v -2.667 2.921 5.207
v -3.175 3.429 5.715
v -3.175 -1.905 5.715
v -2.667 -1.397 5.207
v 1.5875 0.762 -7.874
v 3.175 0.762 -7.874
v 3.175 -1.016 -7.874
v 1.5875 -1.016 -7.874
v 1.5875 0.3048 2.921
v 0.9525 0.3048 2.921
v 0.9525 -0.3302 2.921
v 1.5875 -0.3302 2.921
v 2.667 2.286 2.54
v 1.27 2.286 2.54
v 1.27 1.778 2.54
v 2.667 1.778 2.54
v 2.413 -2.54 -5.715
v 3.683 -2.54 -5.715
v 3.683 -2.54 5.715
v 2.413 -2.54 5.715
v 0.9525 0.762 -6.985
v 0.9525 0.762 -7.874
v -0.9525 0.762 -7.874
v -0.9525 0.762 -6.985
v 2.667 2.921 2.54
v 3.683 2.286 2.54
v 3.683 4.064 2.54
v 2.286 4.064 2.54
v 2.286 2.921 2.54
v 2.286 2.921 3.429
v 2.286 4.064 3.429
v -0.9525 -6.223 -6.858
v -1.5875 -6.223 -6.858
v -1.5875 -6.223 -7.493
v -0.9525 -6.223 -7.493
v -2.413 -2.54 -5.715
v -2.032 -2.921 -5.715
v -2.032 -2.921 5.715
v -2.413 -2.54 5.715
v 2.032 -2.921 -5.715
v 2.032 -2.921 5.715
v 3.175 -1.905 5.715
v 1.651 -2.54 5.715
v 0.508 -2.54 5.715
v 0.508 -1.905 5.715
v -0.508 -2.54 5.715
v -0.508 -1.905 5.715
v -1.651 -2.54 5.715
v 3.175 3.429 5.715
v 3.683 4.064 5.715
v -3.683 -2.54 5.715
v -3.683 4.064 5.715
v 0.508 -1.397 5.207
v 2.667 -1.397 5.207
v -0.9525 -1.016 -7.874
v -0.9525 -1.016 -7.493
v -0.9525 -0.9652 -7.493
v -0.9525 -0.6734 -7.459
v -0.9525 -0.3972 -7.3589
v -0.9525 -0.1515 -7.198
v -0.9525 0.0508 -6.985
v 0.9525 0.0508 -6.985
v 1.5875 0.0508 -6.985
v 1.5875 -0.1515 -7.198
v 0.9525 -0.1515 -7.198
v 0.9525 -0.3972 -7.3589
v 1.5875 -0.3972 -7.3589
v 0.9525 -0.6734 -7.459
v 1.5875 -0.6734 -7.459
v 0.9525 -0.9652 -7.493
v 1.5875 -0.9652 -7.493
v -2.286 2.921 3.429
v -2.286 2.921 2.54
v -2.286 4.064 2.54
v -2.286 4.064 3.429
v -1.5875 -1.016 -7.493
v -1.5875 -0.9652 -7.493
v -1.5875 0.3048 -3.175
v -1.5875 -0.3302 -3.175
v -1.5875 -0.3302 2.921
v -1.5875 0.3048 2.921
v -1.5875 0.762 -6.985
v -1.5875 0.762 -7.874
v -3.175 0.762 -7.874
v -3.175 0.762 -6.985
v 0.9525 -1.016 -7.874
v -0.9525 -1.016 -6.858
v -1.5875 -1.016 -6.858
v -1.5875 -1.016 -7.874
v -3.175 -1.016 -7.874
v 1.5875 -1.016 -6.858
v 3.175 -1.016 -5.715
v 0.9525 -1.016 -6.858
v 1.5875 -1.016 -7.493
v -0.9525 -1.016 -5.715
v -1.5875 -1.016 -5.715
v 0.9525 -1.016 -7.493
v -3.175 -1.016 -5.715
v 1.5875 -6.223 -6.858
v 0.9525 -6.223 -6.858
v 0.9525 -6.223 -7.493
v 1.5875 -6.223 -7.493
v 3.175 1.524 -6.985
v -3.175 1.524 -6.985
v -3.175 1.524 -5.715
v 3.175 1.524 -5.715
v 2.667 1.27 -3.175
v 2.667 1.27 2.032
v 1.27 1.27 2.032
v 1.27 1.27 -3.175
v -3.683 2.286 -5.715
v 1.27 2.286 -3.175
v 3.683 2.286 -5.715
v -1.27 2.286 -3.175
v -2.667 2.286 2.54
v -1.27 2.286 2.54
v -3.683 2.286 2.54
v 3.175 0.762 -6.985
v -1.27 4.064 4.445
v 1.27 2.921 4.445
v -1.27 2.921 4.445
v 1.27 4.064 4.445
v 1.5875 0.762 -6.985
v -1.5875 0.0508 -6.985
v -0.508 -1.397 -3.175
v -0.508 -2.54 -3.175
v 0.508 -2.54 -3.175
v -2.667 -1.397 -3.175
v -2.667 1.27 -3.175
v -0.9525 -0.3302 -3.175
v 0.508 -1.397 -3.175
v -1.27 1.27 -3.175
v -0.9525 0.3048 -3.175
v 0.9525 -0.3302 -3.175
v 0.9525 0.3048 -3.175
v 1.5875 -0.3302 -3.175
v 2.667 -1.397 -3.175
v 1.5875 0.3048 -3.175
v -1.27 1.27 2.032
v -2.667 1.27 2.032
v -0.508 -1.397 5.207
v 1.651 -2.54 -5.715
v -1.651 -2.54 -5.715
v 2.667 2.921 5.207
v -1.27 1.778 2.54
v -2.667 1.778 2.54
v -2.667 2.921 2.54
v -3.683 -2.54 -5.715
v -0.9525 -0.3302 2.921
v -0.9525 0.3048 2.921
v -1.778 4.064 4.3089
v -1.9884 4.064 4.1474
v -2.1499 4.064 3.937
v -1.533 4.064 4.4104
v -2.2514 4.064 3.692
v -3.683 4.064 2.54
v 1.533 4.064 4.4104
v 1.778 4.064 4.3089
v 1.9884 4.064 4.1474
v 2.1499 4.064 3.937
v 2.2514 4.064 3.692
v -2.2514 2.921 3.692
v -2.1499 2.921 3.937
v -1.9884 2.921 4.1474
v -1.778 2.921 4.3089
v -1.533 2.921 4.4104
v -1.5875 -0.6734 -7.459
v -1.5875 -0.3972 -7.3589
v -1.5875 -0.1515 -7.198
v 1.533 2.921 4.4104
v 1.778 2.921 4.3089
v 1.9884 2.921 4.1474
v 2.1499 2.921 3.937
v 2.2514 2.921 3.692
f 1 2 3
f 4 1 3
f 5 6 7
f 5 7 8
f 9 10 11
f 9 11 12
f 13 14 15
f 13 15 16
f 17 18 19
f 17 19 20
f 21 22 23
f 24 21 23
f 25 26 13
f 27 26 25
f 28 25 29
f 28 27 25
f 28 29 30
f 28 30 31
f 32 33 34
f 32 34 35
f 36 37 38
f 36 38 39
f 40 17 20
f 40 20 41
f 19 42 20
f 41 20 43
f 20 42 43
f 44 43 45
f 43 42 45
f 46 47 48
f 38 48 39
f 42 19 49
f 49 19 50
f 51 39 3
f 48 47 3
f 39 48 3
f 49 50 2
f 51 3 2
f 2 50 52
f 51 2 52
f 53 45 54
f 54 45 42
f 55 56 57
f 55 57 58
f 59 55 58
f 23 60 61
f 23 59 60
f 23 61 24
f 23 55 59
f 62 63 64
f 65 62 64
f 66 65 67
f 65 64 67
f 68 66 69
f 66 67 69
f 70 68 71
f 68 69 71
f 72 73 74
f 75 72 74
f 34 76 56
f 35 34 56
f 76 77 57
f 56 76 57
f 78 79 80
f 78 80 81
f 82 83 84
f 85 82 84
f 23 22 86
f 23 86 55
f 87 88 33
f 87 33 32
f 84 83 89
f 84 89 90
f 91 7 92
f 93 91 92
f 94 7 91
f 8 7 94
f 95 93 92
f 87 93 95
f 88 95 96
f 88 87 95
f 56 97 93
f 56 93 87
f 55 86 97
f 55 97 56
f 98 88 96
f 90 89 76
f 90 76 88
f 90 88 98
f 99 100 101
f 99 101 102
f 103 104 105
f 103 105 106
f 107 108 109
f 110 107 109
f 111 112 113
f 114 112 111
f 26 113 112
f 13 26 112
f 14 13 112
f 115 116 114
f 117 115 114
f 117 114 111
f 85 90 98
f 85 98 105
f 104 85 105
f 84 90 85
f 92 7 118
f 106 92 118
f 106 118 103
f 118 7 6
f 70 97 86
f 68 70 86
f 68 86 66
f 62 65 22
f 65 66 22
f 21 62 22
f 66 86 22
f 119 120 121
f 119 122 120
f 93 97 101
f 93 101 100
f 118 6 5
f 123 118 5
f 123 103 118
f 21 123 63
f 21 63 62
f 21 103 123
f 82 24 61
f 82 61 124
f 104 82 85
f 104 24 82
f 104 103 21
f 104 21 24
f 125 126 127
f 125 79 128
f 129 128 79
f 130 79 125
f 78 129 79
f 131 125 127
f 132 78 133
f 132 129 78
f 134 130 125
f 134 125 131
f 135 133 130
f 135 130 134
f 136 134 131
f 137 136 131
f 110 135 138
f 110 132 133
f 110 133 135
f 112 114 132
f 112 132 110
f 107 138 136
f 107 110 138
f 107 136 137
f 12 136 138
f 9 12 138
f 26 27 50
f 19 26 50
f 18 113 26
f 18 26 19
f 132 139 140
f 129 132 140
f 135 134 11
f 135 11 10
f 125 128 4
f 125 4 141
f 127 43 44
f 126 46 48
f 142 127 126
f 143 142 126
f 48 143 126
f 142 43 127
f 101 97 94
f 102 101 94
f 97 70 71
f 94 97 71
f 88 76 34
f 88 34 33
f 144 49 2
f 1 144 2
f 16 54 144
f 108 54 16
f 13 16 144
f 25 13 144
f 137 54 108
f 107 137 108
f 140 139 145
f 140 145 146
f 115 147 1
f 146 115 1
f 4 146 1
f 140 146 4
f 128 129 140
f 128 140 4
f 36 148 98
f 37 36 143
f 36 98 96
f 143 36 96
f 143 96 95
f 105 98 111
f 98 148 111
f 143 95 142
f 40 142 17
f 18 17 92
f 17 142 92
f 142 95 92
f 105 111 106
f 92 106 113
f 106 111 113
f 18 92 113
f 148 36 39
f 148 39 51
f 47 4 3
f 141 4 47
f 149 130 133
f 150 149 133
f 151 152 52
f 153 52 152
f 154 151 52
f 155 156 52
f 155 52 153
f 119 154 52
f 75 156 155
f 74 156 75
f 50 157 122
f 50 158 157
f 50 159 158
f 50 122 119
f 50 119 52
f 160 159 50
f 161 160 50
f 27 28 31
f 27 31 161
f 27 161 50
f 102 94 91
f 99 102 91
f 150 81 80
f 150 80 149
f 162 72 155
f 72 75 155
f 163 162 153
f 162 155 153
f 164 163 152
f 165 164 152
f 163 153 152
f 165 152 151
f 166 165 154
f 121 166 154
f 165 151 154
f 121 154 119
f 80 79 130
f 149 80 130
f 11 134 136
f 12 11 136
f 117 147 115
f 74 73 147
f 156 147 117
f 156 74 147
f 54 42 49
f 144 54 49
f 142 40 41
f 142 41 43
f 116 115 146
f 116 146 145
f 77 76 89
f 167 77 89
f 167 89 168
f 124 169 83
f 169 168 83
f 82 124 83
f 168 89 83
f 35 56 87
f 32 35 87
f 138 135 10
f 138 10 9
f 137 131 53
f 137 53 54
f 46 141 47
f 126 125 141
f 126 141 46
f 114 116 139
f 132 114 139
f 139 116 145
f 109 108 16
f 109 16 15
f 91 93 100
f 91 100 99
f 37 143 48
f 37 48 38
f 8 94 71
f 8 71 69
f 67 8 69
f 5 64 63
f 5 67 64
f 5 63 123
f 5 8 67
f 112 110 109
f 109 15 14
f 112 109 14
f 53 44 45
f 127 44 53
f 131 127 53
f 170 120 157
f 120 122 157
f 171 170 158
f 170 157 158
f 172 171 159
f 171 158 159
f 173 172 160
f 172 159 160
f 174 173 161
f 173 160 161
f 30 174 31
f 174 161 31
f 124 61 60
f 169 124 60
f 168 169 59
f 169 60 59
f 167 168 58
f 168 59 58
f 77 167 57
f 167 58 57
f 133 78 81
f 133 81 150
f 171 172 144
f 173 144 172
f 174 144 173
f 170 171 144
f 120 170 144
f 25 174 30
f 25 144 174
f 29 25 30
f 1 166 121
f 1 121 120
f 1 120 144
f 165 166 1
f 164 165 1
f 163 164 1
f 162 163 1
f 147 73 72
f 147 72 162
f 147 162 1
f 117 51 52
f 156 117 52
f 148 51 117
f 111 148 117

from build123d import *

# Parameters (mm, degrees)
BOSS_EXTRUDE1_DEPTH  = 8.255000001
CUT_EXTRUDE1_DEPTH   = 5.715
BOSS_EXTRUDE2_DEPTH  = 3.175
SKETCH4_W            = 4.572
SKETCH4_H            = 1.143
CUT_EXTRUDE2_DEPTH   = 1.905
SKETCH5_W            = 0.635
SKETCH5_H            = 0.635
BOSS_EXTRUDE3_DEPTH  = 6.096
SKETCH6_W            = 0.635
SKETCH6_H            = 0.635
BOSS_EXTRUDE4_DEPTH  = 6.096
SKETCH7_W            = 0.635
SKETCH7_H            = 1.0668
BOSS_EXTRUDE5_DEPTH  = 1.778
SKETCH8_W            = 0.635
SKETCH8_H            = 1.0668
BOSS_EXTRUDE6_DEPTH  = 1.778
SKETCH9_W            = 0.635
SKETCH9_H            = 0.635
BOSS_EXTRUDE7_DEPTH  = 5.207
SKETCH10_W           = 0.635
SKETCH10_H           = 0.635
BOSS_EXTRUDE8_DEPTH  = 5.207
BOSS_EXTRUDE9_DEPTH  = 1.27
SKETCH12_W           = 1.5875
SKETCH12_H           = 1.778
BOSS_EXTRUDE10_DEPTH = 0.889
SKETCH13_W           = 1.905
SKETCH13_H           = 1.778
BOSS_EXTRUDE11_DEPTH = 0.889
SKETCH14_W           = 1.5875
SKETCH14_H           = 1.778
BOSS_EXTRUDE12_DEPTH = 0.889
FILLET1_R            = 1.27
FILLET2_R            = 1.27
CHAMFER1_SIZE        = 0.508
CHAMFER2_SIZE        = 0.508
DRAFT1_ANGLE         = 45
CHAMFER3_SIZE        = 0.508
FILLET3_R            = 1.016


with BuildPart() as part:
    # Sketch1 → Boss-Extrude1 (new body)
    with BuildSketch(Plane.XY.offset(2.54)):
        Polygon((3.683, 2.286), (-3.683, 2.286), (-3.683, -2.54), (-2.413, -2.54), (-1.651, -3.302), (-1.651, -2.54), (1.651, -2.54), (1.651, -3.302), (2.413, -2.54), (3.683, -2.54), align=None)
    extrude(amount=-BOSS_EXTRUDE1_DEPTH)

    # Sketch2 → Cut-Extrude1 (cut)
    with BuildSketch(Plane.XY.offset(2.54)):
        Polygon((2.667, -1.397), (2.667, 1.27), (1.27, 1.27), (1.27, 2.286000001), (-1.270000001, 2.286000001), (-1.270000001, 1.27), (-2.667, 1.27), (-2.667, -1.397), (-0.508, -1.397), (-0.508, -2.54), (0.508, -2.54), (0.508, -1.397), align=None)
    extrude(amount=-CUT_EXTRUDE1_DEPTH, mode=Mode.SUBTRACT)

    # Sketch3 → Boss-Extrude2 (add)
    with BuildSketch(Plane.XY.offset(2.54)):
        Polygon((0.508, -1.397), (2.667, -1.397), (2.667, 2.921), (-2.667, 2.921), (-2.667, -1.397), (-0.508, -1.397), (-0.508, -2.54), (-1.651, -2.54), (-1.651, -3.302), (-2.413, -2.54), (-3.683, -2.54), (-3.683, 4.064), (3.683, 4.064), (3.683, -2.54), (2.413, -2.54), (1.651, -3.302), (1.651, -2.54), (0.508, -2.54), align=None)
    extrude(amount=BOSS_EXTRUDE2_DEPTH)

    # Sketch4 → Cut-Extrude2 (cut)
    with BuildSketch(Plane(origin=(0, 0, 2.54), x_dir=(-1, 0, 0), z_dir=(0, 0, -1))):
        with Locations((0, 3.4925)):
            Rectangle(SKETCH4_W, SKETCH4_H)
    extrude(amount=-CUT_EXTRUDE2_DEPTH, mode=Mode.SUBTRACT)

    # Sketch5 → Boss-Extrude3 (add)
    with BuildSketch(Plane.XY.offset(-3.175)):
        with Locations((-1.27, -0.0127)):
            Rectangle(SKETCH5_W, SKETCH5_H)
    extrude(amount=BOSS_EXTRUDE3_DEPTH)

    # Sketch6 → Boss-Extrude4 (add)
    with BuildSketch(Plane.XY.offset(-3.175)):
        with Locations((1.27, -0.0127)):
            Rectangle(SKETCH6_W, SKETCH6_H)
    extrude(amount=BOSS_EXTRUDE4_DEPTH)

    # Sketch7 → Boss-Extrude5 (add)
    with BuildSketch(Plane(origin=(0, 0, -5.715000001), x_dir=(-1, 0, 0), z_dir=(0, 0, -1))):
        with Locations((1.27, -0.4826)):
            Rectangle(SKETCH7_W, SKETCH7_H)
    extrude(amount=BOSS_EXTRUDE5_DEPTH)

    # Sketch8 → Boss-Extrude6 (add)
    with BuildSketch(Plane(origin=(0, 0, -5.715000001), x_dir=(-1, 0, 0), z_dir=(0, 0, -1))):
        with Locations((-1.27, -0.4826)):
            Rectangle(SKETCH8_W, SKETCH8_H)
    extrude(amount=BOSS_EXTRUDE6_DEPTH)

    # Sketch9 → Boss-Extrude7 (add)
    with BuildSketch(Plane.XZ.offset(1.016)):
        with Locations((-1.27, -7.1755)):
            Rectangle(SKETCH9_W, SKETCH9_H)
    extrude(amount=BOSS_EXTRUDE7_DEPTH)

    # Sketch10 → Boss-Extrude8 (add)
    with BuildSketch(Plane.XZ.offset(1.016)):
        with Locations((1.27, -7.1755)):
            Rectangle(SKETCH10_W, SKETCH10_H)
    extrude(amount=BOSS_EXTRUDE8_DEPTH)

    # Sketch11 → Boss-Extrude9 (add)
    with BuildSketch(Plane(origin=(0, 0, -6.985), x_dir=(-1, 0, 0), z_dir=(0, 0, -1))):
        Polygon((0.9525, 0.050800001), (1.5875, 0.050800001), (1.5875, -1.016), (3.175, -1.016), (3.175, 1.524), (-3.175, 1.524), (-3.175, -1.016), (-1.5875, -1.016), (-1.5875, 0.050800001), (-0.9525, 0.050800001), (-0.9525, -1.016), (0.9525, -1.016), align=None)
    extrude(amount=-BOSS_EXTRUDE9_DEPTH)

    # Sketch12 → Boss-Extrude10 (add)
    with BuildSketch(Plane(origin=(0, 0, -7.874), x_dir=(-1, 0, 0), z_dir=(0, 0, -1))):
        with Locations((2.38125, -0.127)):
            Rectangle(SKETCH12_W, SKETCH12_H)
    extrude(amount=-BOSS_EXTRUDE10_DEPTH)

    # Sketch13 → Boss-Extrude11 (add)
    with BuildSketch(Plane(origin=(0, 0, -7.874), x_dir=(-1, 0, 0), z_dir=(0, 0, -1))):
        with Locations((0, -0.127)):
            Rectangle(SKETCH13_W, SKETCH13_H)
    extrude(amount=-BOSS_EXTRUDE11_DEPTH)

    # Sketch14 → Boss-Extrude12 (add)
    with BuildSketch(Plane(origin=(0, 0, -7.874), x_dir=(-1, 0, 0), z_dir=(0, 0, -1))):
        with Locations((-2.38125, -0.127)):
            Rectangle(SKETCH14_W, SKETCH14_H)
    extrude(amount=-BOSS_EXTRUDE12_DEPTH)

    # Fillet1
    # the kernel refuses this fillet: 1.27 mm, written as the material it takes off along each edge
    with BuildSketch(Plane(origin=(1.5875, 0.0508, -7.493), x_dir=(0, -1, 0), z_dir=(-1, 0, 0))) as fillet1_piece_1:
        with BuildLine():
            CenterArc((1.016, 1.27), FILLET1_R, 216.869897624, 53.130102376)
            Line((0, 0.508), (0, 0))
            Line((0, 0), (1.016, 0))
        make_face()
    extrude(amount=0.635, mode=Mode.SUBTRACT)

    # Fillet2
    # the kernel refuses this fillet: 1.27 mm, written as the material it takes off along each edge
    with BuildSketch(Plane(origin=(1.5875, 0.0508, -7.493), x_dir=(0, -1, 0), z_dir=(-1, 0, 0))) as fillet2_piece_1_section:
        with BuildLine():
            CenterArc((1.016, 1.27), FILLET2_R, 216.869897624, 53.130102376)
            Line((0, 0.508), (-0.02032, 0.49276))
            ThreePointArc((-0.02032, 0.49276), (-0.0254, 0.254), (-0.0254, 0))
            Line((-0.0254, 0), (0, -0.0254))
            Line((0, -0.0254), (1.016, -0.0254))
            Line((1.016, -0.0254), (1.016, 0))
        make_face()
    fillet2_piece_1 = extrude(amount=3.175, mode=Mode.PRIVATE)
    fillet2_piece_1 = split(fillet2_piece_1, bisect_by=Plane(origin=(0.9525, -0.210671932, -7.36296659), z_dir=(1, 0, 0)), keep=Keep.TOP, mode=Mode.PRIVATE)
    add(fillet2_piece_1, mode=Mode.SUBTRACT)
    with BuildSketch(Plane(origin=(-0.9525, 0.0508, -7.493), x_dir=(0, -1, 0), z_dir=(-1, 0, 0))) as fillet2_piece_2:
        with BuildLine():
            CenterArc((1.016, 1.27), FILLET2_R, 216.869897624, 53.130102376)
            Line((0, 0.508), (-0.02032, 0.49276))
            ThreePointArc((-0.02032, 0.49276), (-0.0254, 0.254), (-0.0254, 0))
            Line((-0.0254, 0), (0, -0.0254))
            Line((0, -0.0254), (1.016, -0.0254))
            Line((1.016, -0.0254), (1.016, 0))
        make_face()
    extrude(amount=0.635, mode=Mode.SUBTRACT)

    # Chamfer1
    chamfer1_edges = [part.edges().sort_by_distance(p)[0] for p in [
        (1.9685, 1.27, 2.54),
    ]]
    chamfer(chamfer1_edges, length=CHAMFER1_SIZE)

    # Chamfer2
    chamfer2_edges = [part.edges().sort_by_distance(p)[0] for p in [
        (-1.9685, 1.27, 2.54),
    ]]
    chamfer(chamfer2_edges, length=CHAMFER2_SIZE)

    # Draft1
    draft1_faces = [part.faces().sort_by_distance(p)[0] for p in [
        (1.651, -2.921, 0),
        (-1.651, -2.921, 0),
    ]]
    draft(draft1_faces, Plane(origin=(-1.651, -2.54, -5.715000001), x_dir=(0, 0, -1), z_dir=(0, -1, 0)), DRAFT1_ANGLE)

    # Chamfer3
    chamfer3_edges = [part.edges().sort_by_distance(p)[0] for p in [
        (-1.5875, -1.397, 5.715),
        (-2.667, 0.762, 5.715),
        (0, 2.921, 5.715),
        (2.667, 0.762, 5.715),
        (1.5875, -1.397, 5.715),
    ]]
    chamfer(chamfer3_edges, length=CHAMFER3_SIZE)

    # Fillet3
    fillet3_edges = [part.edges().sort_by_distance(p)[0] for p in [
        (-2.286, 3.4925, 4.445),
        (2.286, 3.4925, 4.445),
    ]]
    fillet(fillet3_edges, radius=FILLET3_R)


solid = part.part
